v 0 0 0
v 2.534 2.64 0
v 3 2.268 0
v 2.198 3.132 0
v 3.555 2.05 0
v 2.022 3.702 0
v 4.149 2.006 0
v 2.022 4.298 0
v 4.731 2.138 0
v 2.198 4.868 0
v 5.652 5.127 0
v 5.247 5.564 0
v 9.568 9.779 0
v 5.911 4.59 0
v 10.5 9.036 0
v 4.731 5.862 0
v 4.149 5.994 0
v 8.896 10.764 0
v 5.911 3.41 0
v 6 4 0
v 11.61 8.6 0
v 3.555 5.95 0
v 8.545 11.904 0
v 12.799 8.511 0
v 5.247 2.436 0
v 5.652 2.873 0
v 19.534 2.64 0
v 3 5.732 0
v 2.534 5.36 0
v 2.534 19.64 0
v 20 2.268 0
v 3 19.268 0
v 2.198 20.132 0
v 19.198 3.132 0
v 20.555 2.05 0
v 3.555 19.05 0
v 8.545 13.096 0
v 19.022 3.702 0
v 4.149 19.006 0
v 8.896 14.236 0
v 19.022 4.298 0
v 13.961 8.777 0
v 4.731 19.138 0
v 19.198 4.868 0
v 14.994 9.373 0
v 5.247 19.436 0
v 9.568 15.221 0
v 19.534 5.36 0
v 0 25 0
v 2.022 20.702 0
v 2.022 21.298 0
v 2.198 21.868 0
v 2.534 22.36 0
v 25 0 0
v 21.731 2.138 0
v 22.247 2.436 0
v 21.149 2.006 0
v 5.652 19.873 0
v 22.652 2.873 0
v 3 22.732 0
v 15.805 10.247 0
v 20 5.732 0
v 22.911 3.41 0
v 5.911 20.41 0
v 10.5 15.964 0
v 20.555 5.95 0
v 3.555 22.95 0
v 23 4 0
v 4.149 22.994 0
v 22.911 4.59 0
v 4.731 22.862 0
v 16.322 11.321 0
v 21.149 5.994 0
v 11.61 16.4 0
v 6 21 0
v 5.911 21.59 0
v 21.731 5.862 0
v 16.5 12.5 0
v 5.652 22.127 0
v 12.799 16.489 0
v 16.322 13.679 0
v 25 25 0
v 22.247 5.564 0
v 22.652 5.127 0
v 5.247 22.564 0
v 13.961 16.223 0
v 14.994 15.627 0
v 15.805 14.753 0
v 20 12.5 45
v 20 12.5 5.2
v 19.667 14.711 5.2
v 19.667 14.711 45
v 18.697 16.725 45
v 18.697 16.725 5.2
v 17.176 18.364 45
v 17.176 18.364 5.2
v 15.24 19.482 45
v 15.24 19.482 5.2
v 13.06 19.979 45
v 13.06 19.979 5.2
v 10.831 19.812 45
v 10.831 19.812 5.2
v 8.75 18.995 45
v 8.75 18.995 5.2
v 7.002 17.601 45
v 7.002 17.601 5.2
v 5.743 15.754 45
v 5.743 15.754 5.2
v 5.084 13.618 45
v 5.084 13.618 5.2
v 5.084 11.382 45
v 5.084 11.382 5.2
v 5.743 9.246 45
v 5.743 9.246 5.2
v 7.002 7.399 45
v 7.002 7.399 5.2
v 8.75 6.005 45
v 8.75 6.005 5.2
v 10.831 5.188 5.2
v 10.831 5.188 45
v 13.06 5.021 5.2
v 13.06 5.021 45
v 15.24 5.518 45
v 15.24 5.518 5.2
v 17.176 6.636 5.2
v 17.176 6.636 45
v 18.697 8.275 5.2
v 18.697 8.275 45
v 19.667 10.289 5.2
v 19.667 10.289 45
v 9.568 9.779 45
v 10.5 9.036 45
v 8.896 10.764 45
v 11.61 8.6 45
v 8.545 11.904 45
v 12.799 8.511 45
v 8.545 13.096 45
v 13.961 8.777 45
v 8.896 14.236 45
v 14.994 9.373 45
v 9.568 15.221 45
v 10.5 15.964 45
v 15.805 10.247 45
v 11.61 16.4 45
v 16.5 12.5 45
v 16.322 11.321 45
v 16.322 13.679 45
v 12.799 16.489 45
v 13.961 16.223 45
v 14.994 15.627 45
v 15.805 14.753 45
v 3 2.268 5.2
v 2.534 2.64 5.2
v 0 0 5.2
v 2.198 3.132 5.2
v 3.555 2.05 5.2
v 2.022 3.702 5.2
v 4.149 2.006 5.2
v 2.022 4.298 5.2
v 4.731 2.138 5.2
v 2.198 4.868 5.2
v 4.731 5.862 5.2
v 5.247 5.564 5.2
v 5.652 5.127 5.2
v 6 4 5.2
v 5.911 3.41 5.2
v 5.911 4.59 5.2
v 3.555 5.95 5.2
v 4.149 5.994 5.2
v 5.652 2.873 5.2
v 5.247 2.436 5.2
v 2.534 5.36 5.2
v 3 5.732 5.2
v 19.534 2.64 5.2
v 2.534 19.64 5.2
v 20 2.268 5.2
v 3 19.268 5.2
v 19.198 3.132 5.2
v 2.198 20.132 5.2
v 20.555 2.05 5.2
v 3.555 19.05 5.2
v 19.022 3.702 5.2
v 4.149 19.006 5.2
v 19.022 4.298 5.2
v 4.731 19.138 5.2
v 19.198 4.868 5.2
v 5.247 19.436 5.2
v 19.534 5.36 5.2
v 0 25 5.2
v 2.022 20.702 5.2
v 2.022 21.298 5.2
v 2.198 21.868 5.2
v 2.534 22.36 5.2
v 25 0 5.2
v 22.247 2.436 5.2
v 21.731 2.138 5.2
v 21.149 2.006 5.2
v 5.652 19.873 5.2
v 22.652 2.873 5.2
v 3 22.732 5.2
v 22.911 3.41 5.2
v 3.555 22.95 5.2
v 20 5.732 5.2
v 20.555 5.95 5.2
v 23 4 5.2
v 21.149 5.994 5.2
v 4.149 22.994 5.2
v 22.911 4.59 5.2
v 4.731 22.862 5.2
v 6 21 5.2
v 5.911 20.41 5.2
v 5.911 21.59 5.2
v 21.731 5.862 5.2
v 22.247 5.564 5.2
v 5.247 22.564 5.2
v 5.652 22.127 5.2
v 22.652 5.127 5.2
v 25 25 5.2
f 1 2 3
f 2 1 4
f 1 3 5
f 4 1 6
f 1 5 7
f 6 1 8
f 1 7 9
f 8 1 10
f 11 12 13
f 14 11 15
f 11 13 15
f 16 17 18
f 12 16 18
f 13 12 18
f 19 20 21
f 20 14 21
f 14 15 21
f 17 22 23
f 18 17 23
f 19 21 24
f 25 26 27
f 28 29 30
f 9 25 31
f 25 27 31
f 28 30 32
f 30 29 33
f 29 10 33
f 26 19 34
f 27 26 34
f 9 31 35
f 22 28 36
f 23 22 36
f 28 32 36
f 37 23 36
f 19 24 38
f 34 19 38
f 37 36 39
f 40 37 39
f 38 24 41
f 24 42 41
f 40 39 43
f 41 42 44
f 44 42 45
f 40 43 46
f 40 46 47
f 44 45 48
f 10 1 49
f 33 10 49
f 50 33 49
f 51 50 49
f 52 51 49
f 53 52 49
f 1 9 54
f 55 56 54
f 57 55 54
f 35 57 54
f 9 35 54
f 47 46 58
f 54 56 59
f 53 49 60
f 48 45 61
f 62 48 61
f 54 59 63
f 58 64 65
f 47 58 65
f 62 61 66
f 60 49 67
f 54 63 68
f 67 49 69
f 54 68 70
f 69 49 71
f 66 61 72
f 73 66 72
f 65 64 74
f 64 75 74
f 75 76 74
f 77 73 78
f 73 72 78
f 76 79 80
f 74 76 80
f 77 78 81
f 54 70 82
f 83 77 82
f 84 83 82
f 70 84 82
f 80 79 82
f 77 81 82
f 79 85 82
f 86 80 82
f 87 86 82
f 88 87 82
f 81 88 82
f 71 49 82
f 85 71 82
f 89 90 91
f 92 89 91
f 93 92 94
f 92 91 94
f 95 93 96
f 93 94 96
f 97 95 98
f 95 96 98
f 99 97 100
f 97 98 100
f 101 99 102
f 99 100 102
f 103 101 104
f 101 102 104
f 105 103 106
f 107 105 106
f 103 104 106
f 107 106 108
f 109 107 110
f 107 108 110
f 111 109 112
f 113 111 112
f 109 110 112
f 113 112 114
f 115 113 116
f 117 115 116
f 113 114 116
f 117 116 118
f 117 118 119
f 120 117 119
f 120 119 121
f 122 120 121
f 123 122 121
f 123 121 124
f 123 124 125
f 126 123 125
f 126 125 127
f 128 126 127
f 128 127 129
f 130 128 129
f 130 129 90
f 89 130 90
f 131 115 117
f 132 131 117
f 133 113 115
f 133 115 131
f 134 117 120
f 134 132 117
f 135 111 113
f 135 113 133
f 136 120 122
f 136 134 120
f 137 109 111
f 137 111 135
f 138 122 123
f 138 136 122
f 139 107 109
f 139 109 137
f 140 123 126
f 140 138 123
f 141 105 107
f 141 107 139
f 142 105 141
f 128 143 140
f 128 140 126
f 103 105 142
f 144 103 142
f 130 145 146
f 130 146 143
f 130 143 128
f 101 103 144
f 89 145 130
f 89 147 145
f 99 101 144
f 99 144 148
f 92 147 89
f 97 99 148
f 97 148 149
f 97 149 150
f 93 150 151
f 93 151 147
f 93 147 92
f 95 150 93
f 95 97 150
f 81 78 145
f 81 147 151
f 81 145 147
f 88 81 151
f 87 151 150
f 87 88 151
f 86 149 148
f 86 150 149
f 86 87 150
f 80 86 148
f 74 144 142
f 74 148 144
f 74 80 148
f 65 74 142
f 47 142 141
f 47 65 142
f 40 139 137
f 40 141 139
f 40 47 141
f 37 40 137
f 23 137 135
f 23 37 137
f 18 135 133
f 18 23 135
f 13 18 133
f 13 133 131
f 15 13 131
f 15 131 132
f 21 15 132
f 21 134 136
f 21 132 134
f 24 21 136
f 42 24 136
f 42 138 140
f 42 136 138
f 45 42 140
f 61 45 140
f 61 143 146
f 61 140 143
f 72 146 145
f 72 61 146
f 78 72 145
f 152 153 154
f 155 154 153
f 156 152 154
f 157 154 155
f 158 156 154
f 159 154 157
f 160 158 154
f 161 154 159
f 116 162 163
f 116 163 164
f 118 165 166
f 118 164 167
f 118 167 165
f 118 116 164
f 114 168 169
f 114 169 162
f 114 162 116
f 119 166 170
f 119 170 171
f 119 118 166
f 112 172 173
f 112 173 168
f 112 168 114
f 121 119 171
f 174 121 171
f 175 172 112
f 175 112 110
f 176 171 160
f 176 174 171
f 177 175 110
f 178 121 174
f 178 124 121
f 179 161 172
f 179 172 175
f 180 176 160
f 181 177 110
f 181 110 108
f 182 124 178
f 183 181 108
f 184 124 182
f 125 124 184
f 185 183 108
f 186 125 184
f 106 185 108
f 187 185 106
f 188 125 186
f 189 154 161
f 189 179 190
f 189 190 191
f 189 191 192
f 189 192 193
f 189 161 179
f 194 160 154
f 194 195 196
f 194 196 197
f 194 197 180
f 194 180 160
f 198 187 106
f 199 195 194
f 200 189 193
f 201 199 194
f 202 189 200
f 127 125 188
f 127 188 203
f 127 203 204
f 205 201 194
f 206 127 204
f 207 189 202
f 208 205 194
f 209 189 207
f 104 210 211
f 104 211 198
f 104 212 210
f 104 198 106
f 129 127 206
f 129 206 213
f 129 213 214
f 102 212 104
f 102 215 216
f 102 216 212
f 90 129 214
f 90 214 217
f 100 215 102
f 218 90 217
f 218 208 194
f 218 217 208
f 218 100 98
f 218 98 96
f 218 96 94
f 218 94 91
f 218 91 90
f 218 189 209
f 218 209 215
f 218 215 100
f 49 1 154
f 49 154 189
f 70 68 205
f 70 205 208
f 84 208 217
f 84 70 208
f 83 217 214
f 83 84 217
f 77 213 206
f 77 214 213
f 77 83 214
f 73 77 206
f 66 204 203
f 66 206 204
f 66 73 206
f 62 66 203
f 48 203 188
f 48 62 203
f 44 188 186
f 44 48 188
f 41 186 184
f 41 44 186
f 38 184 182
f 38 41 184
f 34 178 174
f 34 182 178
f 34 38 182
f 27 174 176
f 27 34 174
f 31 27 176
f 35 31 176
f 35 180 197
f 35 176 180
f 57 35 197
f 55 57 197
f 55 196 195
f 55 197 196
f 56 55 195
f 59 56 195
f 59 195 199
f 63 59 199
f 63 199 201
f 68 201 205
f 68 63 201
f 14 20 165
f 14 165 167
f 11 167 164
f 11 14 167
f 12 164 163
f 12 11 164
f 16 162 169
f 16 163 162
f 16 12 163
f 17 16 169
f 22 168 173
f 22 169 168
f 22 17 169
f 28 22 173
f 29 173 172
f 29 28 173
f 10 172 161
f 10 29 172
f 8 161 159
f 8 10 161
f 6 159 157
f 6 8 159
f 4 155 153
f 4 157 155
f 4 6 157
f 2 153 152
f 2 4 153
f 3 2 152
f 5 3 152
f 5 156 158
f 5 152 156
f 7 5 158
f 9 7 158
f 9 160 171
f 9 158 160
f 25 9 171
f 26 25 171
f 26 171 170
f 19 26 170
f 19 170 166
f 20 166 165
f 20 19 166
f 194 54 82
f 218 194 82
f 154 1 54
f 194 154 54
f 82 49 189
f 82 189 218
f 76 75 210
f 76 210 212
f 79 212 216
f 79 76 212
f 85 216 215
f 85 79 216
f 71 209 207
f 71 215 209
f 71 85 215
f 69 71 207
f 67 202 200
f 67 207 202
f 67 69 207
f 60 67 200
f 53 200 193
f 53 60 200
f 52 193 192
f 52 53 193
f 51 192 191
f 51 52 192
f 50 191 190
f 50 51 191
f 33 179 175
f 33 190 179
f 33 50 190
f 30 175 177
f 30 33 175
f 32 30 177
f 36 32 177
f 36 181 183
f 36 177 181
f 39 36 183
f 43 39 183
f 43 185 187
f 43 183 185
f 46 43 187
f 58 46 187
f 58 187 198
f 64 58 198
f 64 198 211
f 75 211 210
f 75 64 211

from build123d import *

# Parameters (mm, degrees)
CYLINDER027_R     = 2
CYLINDER027_DEPTH = 10
CYLINDER025_R     = 2
CYLINDER025_DEPTH = 10
CYLINDER024_R     = 2
CYLINDER024_DEPTH = 10
CYLINDER023_R     = 4
CYLINDER023_DEPTH = 60
CYLINDER028_R     = 7.5
CYLINDER028_DEPTH = 40
BOX005_W          = 25
BOX005_H          = 25
BOX005_DEPTH      = 5.2


with BuildPart() as cylinder027:
    # Cylinder027 → Cylinder027 (new body)
    with BuildSketch(Plane(origin=(21, 4, -2), x_dir=(1, 0, 0), z_dir=(0, 0, 1))):
        Circle(CYLINDER027_R)
    extrude(amount=CYLINDER027_DEPTH)


with BuildPart() as cylinder025:
    # Cylinder025 → Cylinder025 (new body)
    with BuildSketch(Plane(origin=(4, 21, -2), x_dir=(1, 0, 0), z_dir=(0, 0, 1))):
        Circle(CYLINDER025_R)
    extrude(amount=CYLINDER025_DEPTH)


with BuildPart() as cylinder024:
    # Cylinder024 → Cylinder024 (new body)
    with BuildSketch(Plane(origin=(4, 4, -2), x_dir=(1, 0, 0), z_dir=(0, 0, 1))):
        Circle(CYLINDER024_R)
    extrude(amount=CYLINDER024_DEPTH)


with BuildPart() as cylinder023:
    # Cylinder023 → Cylinder023 (new body)
    with BuildSketch(Plane(origin=(12.5, 12.5, -7), x_dir=(1, 0, 0), z_dir=(0, 0, 1))):
        Circle(CYLINDER023_R)
    extrude(amount=CYLINDER023_DEPTH)


with BuildPart() as cylinder028:
    # Cylinder028 → Cylinder028 (new body)
    with BuildSketch(Plane(origin=(12.5, 12.5, 5), x_dir=(1, 0, 0), z_dir=(0, 0, 1))):
        Circle(CYLINDER028_R)
    extrude(amount=CYLINDER028_DEPTH)


with BuildPart() as cut026:
    # Box005 → Box005 (new body)
    with BuildSketch(Plane.XY):
        with Locations((12.5, 12.5)):
            Rectangle(BOX005_W, BOX005_H)
    extrude(amount=BOX005_DEPTH)

    # Fusion006: union Cylinder028
    add(cylinder028.part)

    # Cut027: cut Cylinder023
    add(cylinder023.part, mode=Mode.SUBTRACT)

    # Cut028: cut Cylinder024
    add(cylinder024.part, mode=Mode.SUBTRACT)

    # Cut025: cut Cylinder025
    add(cylinder025.part, mode=Mode.SUBTRACT)

    # Cut026: cut Cylinder027
    add(cylinder027.part, mode=Mode.SUBTRACT)


solid = cut026.part
